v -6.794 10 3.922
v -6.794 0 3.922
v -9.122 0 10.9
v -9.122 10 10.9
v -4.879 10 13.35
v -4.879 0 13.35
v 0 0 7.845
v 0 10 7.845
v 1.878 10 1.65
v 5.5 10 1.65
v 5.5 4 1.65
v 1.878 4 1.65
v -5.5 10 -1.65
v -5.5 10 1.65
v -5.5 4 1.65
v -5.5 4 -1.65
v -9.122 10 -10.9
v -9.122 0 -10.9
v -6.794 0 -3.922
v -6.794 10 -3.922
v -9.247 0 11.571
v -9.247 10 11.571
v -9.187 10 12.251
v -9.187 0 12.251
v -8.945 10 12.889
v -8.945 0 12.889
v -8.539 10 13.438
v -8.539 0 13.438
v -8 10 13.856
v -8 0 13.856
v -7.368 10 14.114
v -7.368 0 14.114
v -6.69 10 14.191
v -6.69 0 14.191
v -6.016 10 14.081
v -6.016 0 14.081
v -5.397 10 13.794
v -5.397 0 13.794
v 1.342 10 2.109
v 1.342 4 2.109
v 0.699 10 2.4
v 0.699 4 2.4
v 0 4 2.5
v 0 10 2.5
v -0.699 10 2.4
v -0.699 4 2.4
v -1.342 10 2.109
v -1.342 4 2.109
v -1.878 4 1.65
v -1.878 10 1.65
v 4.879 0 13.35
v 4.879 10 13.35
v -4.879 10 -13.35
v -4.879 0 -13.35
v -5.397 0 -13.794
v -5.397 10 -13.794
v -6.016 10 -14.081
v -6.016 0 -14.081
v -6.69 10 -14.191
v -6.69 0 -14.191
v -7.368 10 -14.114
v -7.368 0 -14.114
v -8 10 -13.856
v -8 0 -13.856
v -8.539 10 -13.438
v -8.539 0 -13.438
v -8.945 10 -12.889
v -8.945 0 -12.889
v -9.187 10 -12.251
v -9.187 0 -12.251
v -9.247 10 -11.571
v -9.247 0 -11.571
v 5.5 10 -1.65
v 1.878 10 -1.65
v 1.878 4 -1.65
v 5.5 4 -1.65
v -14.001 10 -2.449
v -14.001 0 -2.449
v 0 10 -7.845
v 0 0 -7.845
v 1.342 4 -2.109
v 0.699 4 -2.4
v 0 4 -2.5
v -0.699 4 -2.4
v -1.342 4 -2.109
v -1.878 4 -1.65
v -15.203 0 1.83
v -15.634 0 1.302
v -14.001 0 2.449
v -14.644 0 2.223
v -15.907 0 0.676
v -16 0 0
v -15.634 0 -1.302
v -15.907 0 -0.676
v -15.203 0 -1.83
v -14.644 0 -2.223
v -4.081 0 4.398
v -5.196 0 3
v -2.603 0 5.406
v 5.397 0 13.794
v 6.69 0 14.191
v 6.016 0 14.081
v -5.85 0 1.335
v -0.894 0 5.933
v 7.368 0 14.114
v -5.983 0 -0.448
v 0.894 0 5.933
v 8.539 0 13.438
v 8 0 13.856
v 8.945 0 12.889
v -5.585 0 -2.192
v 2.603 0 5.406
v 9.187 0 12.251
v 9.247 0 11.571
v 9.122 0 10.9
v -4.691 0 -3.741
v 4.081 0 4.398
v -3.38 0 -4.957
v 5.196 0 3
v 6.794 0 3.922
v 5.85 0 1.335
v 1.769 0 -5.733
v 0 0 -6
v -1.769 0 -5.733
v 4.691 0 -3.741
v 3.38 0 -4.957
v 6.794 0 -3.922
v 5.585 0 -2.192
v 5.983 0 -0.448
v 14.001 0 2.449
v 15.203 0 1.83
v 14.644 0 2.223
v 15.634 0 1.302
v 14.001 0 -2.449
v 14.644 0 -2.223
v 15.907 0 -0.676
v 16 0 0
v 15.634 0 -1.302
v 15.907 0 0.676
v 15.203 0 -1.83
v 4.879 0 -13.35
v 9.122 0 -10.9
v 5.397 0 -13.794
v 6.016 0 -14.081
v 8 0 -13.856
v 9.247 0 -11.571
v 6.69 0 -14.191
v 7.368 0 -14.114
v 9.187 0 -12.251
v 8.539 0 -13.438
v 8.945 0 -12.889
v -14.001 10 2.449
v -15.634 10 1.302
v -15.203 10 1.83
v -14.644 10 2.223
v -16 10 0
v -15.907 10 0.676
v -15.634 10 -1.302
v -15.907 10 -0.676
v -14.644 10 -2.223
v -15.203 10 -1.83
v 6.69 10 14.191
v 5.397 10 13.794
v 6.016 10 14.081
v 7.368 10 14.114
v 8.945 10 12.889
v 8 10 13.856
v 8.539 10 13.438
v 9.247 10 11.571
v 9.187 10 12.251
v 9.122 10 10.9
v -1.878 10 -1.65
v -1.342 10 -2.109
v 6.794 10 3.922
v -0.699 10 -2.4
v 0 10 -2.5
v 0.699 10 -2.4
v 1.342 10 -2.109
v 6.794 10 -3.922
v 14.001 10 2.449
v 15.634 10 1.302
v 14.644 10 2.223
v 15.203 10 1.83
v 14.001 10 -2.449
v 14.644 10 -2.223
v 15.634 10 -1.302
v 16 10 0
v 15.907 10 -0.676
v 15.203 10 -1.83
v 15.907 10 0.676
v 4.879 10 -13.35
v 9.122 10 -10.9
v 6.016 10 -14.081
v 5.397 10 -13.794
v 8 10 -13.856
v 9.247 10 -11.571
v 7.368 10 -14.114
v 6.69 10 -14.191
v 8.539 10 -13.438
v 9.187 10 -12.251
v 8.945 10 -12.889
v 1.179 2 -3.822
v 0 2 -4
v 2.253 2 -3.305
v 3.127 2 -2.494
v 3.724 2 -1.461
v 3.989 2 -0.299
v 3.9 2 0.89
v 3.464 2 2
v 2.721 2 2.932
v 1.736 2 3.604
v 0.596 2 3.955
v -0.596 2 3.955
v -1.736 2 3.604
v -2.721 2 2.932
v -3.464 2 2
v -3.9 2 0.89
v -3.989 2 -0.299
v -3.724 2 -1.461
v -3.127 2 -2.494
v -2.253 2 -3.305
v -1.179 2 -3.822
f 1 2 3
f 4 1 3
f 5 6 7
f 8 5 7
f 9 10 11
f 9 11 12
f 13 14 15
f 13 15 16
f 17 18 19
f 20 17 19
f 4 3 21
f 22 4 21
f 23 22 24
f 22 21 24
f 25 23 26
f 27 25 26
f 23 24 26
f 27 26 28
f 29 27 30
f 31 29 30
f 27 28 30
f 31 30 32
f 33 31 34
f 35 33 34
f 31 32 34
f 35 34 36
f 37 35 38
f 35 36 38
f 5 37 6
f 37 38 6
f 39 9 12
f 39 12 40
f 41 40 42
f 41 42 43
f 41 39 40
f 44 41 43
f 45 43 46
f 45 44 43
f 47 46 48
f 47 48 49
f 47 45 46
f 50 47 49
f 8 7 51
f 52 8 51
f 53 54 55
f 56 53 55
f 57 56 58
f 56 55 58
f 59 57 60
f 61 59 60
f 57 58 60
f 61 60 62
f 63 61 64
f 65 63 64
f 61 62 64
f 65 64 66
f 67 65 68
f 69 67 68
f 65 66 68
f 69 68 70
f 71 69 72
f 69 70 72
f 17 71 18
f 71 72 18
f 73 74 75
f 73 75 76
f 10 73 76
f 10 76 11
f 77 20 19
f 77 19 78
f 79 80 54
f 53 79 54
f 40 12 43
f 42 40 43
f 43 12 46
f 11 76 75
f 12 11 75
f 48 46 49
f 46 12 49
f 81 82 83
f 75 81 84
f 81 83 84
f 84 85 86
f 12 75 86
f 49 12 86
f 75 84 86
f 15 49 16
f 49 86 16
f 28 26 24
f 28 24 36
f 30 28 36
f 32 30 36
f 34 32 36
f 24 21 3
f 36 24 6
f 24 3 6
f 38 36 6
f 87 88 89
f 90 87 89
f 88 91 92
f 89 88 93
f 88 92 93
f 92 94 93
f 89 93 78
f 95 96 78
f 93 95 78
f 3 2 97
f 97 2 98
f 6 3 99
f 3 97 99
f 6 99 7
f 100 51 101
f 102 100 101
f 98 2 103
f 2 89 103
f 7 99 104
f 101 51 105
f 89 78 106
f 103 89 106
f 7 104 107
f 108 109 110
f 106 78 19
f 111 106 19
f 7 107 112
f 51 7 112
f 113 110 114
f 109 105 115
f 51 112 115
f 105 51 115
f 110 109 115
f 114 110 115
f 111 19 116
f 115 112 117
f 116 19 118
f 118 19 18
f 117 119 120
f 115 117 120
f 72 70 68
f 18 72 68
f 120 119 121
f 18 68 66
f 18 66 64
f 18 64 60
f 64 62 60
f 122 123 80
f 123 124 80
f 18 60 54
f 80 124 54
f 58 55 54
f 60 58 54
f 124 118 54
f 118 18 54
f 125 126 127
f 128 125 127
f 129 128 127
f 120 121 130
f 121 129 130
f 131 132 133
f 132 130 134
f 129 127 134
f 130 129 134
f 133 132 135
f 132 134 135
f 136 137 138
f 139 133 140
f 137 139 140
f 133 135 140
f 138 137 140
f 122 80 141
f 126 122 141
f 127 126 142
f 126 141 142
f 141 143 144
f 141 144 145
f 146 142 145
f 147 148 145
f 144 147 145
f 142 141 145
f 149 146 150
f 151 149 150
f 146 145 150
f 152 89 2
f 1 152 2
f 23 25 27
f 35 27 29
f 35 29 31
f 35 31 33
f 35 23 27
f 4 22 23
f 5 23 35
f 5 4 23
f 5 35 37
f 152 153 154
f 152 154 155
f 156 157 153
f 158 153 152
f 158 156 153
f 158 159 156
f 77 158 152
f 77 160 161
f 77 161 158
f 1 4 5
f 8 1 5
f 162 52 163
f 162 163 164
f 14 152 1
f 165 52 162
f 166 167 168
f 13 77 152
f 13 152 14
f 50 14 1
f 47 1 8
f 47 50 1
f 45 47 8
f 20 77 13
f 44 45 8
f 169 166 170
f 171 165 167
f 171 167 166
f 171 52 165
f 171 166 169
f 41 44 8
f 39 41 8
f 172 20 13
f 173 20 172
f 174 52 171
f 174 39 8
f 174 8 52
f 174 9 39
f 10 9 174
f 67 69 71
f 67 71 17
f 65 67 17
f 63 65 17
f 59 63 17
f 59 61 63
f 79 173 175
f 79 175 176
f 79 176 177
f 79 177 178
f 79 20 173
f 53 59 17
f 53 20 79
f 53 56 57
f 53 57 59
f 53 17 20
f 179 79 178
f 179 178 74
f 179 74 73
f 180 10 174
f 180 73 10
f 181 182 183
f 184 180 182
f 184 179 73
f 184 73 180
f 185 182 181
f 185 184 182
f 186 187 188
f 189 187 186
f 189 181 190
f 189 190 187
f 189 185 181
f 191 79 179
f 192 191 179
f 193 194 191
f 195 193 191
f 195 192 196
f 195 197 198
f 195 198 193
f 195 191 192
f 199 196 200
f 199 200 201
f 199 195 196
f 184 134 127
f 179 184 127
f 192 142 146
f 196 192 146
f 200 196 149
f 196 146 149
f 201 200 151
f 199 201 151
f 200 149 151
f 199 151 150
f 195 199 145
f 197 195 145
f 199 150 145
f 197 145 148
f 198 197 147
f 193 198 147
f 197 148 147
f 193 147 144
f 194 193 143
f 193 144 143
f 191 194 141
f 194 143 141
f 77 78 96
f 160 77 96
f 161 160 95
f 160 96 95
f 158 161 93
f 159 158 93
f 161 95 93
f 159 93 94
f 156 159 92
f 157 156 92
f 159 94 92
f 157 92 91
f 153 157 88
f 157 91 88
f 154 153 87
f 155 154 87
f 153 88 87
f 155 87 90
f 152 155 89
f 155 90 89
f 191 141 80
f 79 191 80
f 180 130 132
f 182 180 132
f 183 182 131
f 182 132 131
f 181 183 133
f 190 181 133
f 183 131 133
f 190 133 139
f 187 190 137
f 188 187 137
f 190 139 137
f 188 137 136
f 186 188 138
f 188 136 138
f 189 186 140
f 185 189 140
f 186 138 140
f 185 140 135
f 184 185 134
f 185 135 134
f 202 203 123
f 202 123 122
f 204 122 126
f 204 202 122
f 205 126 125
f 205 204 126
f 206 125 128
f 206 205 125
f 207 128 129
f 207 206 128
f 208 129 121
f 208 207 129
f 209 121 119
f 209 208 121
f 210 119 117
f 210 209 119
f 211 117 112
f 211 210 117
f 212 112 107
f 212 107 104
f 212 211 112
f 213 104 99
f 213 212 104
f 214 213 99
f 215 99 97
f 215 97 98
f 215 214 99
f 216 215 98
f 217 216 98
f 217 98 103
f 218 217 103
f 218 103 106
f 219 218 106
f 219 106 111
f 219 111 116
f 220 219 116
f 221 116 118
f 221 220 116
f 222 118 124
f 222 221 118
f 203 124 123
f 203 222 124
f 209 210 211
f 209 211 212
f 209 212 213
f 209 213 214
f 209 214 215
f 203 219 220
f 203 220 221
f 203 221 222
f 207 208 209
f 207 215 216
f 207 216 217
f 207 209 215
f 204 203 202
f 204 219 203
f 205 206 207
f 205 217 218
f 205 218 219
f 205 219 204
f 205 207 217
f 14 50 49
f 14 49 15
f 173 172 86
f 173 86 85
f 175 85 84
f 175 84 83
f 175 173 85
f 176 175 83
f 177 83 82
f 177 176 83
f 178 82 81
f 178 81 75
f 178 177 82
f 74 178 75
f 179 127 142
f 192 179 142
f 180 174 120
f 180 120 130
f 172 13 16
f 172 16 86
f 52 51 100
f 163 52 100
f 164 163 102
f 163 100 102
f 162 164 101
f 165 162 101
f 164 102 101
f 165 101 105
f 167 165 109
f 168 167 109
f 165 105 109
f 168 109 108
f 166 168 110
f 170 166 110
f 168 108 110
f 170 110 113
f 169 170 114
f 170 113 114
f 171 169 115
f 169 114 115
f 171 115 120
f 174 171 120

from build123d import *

# Parameters (mm, degrees)
BOSS_EXTRUDE1_DEPTH = 10
CUT_EXTRUDE1_DEPTH  = 6
SKETCH3_R           = 6
CUT_EXTRUDE2_DEPTH  = 2
CHAMFER1_SIZE       = 2


with BuildPart() as part:
    # Sketch1 → Boss-Extrude1 (new body)
    with BuildSketch(Plane(origin=(0, 0, 0), x_dir=(1, 0, 0), z_dir=(0, 1, 0))):
        with BuildLine():
            ThreePointArc((4.87913418, -13.349613461), (8, -13.856406461), (9.121537298, -10.900260879))
            Line((9.121537298, -10.900260879), (6.793934197, -3.922479738))
            Line((6.793934197, -3.922479738), (14.000671478, -2.449352582))
            ThreePointArc((14.000671478, -2.449352582), (16, 0), (14.000671478, 2.449352582))
            Line((14.000671478, 2.449352582), (6.793934197, 3.922479738))
            Line((6.793934197, 3.922479738), (9.121537298, 10.900260879))
            ThreePointArc((9.121537298, 10.900260879), (8, 13.856406461), (4.87913418, 13.349613461))
            Line((4.87913418, 13.349613461), (0, 7.844959475))
            Line((0, 7.844959475), (-4.87913418, 13.349613461))
            ThreePointArc((-4.87913418, 13.349613461), (-8, 13.856406461), (-9.121537298, 10.900260879))
            Line((-9.121537298, 10.900260879), (-6.793934197, 3.922479738))
            Line((-6.793934197, 3.922479738), (-14.000671478, 2.449352582))
            ThreePointArc((-14.000671478, 2.449352582), (-16, 0), (-14.000671478, -2.449352582))
            Line((-14.000671478, -2.449352582), (-6.793934197, -3.922479738))
            Line((-6.793934197, -3.922479738), (-9.121537298, -10.900260879))
            ThreePointArc((-9.121537298, -10.900260879), (-8, -13.856406461), (-4.87913418, -13.349613461))
            Line((-4.87913418, -13.349613461), (0, -7.844959475))
            Line((0, -7.844959475), (4.87913418, -13.349613461))
        make_face()
    extrude(amount=BOSS_EXTRUDE1_DEPTH)

    # Sketch2 → Cut-Extrude1 (cut)
    # profile 1 of 2: a face of its own
    with BuildSketch(Plane(origin=(0, 10, 0), x_dir=(1, 0, 0), z_dir=(0, 1, 0))):
        with BuildLine():
            Line((-1.878163997, -1.65), (-5.5, -1.65))
            Line((-5.5, -1.65), (-5.5, 1.65))
            Line((-5.5, 1.65), (-1.878163997, 1.65))
            ThreePointArc((-1.878163997, 1.65), (0, 2.5), (1.878163997, 1.65))
            Line((1.878163997, 1.65), (5.5, 1.65))
            Line((5.5, 1.65), (5.5, -1.65))
            Line((5.5, -1.65), (1.878163997, -1.65))
            ThreePointArc((1.878163997, -1.65), (0, -2.5), (-1.878163997, -1.65))
        make_face()
        with BuildLine():
            ThreePointArc((1.809005252, 1.5), (0, 2.35), (-1.809005252, 1.5))
            Line((-1.809005252, 1.5), (-5.35, 1.5))
            Line((-5.35, 1.5), (-5.35, -1.5))
            Line((-5.35, -1.5), (-1.809005252, -1.5))
            ThreePointArc((-1.809005252, -1.5), (0, -2.35), (1.809005252, -1.5))
            Line((1.809005252, -1.5), (5.35, -1.5))
            Line((5.35, -1.5), (5.35, 1.5))
            Line((5.35, 1.5), (1.809005252, 1.5))
        make_face(mode=Mode.SUBTRACT)
    # profile 2 of 2: a face of its own
    with BuildSketch(Plane(origin=(0, 10, 0), x_dir=(1, 0, 0), z_dir=(0, 1, 0))):
        with BuildLine():
            Line((5.35, 1.5), (1.809005252, 1.5))
            ThreePointArc((1.809005252, 1.5), (0, 2.35), (-1.809005252, 1.5))
            Line((-1.809005252, 1.5), (-5.35, 1.5))
            Line((-5.35, 1.5), (-5.35, -1.5))
            Line((-5.35, -1.5), (-1.809005252, -1.5))
            ThreePointArc((-1.809005252, -1.5), (0, -2.35), (1.809005252, -1.5))
            Line((1.809005252, -1.5), (5.35, -1.5))
            Line((5.35, -1.5), (5.35, 1.5))
        make_face()
    extrude(amount=-CUT_EXTRUDE1_DEPTH, mode=Mode.SUBTRACT)

    # Sketch3 → Cut-Extrude2 (cut)
    with BuildSketch(Plane.XZ):
        with Locations(Location((0, 0, 0), (0, 0, 270))):
            Circle(SKETCH3_R)
    extrude(amount=-CUT_EXTRUDE2_DEPTH, mode=Mode.SUBTRACT)

    # Chamfer1
    chamfer1_edges = [part.edges().sort_by_distance(p)[0] for p in [
        (0, 2, 6),
    ]]
    chamfer(chamfer1_edges, length=CHAMFER1_SIZE - 0.0001)  # a hair under: the kernel refuses the full size


solid = part.part
